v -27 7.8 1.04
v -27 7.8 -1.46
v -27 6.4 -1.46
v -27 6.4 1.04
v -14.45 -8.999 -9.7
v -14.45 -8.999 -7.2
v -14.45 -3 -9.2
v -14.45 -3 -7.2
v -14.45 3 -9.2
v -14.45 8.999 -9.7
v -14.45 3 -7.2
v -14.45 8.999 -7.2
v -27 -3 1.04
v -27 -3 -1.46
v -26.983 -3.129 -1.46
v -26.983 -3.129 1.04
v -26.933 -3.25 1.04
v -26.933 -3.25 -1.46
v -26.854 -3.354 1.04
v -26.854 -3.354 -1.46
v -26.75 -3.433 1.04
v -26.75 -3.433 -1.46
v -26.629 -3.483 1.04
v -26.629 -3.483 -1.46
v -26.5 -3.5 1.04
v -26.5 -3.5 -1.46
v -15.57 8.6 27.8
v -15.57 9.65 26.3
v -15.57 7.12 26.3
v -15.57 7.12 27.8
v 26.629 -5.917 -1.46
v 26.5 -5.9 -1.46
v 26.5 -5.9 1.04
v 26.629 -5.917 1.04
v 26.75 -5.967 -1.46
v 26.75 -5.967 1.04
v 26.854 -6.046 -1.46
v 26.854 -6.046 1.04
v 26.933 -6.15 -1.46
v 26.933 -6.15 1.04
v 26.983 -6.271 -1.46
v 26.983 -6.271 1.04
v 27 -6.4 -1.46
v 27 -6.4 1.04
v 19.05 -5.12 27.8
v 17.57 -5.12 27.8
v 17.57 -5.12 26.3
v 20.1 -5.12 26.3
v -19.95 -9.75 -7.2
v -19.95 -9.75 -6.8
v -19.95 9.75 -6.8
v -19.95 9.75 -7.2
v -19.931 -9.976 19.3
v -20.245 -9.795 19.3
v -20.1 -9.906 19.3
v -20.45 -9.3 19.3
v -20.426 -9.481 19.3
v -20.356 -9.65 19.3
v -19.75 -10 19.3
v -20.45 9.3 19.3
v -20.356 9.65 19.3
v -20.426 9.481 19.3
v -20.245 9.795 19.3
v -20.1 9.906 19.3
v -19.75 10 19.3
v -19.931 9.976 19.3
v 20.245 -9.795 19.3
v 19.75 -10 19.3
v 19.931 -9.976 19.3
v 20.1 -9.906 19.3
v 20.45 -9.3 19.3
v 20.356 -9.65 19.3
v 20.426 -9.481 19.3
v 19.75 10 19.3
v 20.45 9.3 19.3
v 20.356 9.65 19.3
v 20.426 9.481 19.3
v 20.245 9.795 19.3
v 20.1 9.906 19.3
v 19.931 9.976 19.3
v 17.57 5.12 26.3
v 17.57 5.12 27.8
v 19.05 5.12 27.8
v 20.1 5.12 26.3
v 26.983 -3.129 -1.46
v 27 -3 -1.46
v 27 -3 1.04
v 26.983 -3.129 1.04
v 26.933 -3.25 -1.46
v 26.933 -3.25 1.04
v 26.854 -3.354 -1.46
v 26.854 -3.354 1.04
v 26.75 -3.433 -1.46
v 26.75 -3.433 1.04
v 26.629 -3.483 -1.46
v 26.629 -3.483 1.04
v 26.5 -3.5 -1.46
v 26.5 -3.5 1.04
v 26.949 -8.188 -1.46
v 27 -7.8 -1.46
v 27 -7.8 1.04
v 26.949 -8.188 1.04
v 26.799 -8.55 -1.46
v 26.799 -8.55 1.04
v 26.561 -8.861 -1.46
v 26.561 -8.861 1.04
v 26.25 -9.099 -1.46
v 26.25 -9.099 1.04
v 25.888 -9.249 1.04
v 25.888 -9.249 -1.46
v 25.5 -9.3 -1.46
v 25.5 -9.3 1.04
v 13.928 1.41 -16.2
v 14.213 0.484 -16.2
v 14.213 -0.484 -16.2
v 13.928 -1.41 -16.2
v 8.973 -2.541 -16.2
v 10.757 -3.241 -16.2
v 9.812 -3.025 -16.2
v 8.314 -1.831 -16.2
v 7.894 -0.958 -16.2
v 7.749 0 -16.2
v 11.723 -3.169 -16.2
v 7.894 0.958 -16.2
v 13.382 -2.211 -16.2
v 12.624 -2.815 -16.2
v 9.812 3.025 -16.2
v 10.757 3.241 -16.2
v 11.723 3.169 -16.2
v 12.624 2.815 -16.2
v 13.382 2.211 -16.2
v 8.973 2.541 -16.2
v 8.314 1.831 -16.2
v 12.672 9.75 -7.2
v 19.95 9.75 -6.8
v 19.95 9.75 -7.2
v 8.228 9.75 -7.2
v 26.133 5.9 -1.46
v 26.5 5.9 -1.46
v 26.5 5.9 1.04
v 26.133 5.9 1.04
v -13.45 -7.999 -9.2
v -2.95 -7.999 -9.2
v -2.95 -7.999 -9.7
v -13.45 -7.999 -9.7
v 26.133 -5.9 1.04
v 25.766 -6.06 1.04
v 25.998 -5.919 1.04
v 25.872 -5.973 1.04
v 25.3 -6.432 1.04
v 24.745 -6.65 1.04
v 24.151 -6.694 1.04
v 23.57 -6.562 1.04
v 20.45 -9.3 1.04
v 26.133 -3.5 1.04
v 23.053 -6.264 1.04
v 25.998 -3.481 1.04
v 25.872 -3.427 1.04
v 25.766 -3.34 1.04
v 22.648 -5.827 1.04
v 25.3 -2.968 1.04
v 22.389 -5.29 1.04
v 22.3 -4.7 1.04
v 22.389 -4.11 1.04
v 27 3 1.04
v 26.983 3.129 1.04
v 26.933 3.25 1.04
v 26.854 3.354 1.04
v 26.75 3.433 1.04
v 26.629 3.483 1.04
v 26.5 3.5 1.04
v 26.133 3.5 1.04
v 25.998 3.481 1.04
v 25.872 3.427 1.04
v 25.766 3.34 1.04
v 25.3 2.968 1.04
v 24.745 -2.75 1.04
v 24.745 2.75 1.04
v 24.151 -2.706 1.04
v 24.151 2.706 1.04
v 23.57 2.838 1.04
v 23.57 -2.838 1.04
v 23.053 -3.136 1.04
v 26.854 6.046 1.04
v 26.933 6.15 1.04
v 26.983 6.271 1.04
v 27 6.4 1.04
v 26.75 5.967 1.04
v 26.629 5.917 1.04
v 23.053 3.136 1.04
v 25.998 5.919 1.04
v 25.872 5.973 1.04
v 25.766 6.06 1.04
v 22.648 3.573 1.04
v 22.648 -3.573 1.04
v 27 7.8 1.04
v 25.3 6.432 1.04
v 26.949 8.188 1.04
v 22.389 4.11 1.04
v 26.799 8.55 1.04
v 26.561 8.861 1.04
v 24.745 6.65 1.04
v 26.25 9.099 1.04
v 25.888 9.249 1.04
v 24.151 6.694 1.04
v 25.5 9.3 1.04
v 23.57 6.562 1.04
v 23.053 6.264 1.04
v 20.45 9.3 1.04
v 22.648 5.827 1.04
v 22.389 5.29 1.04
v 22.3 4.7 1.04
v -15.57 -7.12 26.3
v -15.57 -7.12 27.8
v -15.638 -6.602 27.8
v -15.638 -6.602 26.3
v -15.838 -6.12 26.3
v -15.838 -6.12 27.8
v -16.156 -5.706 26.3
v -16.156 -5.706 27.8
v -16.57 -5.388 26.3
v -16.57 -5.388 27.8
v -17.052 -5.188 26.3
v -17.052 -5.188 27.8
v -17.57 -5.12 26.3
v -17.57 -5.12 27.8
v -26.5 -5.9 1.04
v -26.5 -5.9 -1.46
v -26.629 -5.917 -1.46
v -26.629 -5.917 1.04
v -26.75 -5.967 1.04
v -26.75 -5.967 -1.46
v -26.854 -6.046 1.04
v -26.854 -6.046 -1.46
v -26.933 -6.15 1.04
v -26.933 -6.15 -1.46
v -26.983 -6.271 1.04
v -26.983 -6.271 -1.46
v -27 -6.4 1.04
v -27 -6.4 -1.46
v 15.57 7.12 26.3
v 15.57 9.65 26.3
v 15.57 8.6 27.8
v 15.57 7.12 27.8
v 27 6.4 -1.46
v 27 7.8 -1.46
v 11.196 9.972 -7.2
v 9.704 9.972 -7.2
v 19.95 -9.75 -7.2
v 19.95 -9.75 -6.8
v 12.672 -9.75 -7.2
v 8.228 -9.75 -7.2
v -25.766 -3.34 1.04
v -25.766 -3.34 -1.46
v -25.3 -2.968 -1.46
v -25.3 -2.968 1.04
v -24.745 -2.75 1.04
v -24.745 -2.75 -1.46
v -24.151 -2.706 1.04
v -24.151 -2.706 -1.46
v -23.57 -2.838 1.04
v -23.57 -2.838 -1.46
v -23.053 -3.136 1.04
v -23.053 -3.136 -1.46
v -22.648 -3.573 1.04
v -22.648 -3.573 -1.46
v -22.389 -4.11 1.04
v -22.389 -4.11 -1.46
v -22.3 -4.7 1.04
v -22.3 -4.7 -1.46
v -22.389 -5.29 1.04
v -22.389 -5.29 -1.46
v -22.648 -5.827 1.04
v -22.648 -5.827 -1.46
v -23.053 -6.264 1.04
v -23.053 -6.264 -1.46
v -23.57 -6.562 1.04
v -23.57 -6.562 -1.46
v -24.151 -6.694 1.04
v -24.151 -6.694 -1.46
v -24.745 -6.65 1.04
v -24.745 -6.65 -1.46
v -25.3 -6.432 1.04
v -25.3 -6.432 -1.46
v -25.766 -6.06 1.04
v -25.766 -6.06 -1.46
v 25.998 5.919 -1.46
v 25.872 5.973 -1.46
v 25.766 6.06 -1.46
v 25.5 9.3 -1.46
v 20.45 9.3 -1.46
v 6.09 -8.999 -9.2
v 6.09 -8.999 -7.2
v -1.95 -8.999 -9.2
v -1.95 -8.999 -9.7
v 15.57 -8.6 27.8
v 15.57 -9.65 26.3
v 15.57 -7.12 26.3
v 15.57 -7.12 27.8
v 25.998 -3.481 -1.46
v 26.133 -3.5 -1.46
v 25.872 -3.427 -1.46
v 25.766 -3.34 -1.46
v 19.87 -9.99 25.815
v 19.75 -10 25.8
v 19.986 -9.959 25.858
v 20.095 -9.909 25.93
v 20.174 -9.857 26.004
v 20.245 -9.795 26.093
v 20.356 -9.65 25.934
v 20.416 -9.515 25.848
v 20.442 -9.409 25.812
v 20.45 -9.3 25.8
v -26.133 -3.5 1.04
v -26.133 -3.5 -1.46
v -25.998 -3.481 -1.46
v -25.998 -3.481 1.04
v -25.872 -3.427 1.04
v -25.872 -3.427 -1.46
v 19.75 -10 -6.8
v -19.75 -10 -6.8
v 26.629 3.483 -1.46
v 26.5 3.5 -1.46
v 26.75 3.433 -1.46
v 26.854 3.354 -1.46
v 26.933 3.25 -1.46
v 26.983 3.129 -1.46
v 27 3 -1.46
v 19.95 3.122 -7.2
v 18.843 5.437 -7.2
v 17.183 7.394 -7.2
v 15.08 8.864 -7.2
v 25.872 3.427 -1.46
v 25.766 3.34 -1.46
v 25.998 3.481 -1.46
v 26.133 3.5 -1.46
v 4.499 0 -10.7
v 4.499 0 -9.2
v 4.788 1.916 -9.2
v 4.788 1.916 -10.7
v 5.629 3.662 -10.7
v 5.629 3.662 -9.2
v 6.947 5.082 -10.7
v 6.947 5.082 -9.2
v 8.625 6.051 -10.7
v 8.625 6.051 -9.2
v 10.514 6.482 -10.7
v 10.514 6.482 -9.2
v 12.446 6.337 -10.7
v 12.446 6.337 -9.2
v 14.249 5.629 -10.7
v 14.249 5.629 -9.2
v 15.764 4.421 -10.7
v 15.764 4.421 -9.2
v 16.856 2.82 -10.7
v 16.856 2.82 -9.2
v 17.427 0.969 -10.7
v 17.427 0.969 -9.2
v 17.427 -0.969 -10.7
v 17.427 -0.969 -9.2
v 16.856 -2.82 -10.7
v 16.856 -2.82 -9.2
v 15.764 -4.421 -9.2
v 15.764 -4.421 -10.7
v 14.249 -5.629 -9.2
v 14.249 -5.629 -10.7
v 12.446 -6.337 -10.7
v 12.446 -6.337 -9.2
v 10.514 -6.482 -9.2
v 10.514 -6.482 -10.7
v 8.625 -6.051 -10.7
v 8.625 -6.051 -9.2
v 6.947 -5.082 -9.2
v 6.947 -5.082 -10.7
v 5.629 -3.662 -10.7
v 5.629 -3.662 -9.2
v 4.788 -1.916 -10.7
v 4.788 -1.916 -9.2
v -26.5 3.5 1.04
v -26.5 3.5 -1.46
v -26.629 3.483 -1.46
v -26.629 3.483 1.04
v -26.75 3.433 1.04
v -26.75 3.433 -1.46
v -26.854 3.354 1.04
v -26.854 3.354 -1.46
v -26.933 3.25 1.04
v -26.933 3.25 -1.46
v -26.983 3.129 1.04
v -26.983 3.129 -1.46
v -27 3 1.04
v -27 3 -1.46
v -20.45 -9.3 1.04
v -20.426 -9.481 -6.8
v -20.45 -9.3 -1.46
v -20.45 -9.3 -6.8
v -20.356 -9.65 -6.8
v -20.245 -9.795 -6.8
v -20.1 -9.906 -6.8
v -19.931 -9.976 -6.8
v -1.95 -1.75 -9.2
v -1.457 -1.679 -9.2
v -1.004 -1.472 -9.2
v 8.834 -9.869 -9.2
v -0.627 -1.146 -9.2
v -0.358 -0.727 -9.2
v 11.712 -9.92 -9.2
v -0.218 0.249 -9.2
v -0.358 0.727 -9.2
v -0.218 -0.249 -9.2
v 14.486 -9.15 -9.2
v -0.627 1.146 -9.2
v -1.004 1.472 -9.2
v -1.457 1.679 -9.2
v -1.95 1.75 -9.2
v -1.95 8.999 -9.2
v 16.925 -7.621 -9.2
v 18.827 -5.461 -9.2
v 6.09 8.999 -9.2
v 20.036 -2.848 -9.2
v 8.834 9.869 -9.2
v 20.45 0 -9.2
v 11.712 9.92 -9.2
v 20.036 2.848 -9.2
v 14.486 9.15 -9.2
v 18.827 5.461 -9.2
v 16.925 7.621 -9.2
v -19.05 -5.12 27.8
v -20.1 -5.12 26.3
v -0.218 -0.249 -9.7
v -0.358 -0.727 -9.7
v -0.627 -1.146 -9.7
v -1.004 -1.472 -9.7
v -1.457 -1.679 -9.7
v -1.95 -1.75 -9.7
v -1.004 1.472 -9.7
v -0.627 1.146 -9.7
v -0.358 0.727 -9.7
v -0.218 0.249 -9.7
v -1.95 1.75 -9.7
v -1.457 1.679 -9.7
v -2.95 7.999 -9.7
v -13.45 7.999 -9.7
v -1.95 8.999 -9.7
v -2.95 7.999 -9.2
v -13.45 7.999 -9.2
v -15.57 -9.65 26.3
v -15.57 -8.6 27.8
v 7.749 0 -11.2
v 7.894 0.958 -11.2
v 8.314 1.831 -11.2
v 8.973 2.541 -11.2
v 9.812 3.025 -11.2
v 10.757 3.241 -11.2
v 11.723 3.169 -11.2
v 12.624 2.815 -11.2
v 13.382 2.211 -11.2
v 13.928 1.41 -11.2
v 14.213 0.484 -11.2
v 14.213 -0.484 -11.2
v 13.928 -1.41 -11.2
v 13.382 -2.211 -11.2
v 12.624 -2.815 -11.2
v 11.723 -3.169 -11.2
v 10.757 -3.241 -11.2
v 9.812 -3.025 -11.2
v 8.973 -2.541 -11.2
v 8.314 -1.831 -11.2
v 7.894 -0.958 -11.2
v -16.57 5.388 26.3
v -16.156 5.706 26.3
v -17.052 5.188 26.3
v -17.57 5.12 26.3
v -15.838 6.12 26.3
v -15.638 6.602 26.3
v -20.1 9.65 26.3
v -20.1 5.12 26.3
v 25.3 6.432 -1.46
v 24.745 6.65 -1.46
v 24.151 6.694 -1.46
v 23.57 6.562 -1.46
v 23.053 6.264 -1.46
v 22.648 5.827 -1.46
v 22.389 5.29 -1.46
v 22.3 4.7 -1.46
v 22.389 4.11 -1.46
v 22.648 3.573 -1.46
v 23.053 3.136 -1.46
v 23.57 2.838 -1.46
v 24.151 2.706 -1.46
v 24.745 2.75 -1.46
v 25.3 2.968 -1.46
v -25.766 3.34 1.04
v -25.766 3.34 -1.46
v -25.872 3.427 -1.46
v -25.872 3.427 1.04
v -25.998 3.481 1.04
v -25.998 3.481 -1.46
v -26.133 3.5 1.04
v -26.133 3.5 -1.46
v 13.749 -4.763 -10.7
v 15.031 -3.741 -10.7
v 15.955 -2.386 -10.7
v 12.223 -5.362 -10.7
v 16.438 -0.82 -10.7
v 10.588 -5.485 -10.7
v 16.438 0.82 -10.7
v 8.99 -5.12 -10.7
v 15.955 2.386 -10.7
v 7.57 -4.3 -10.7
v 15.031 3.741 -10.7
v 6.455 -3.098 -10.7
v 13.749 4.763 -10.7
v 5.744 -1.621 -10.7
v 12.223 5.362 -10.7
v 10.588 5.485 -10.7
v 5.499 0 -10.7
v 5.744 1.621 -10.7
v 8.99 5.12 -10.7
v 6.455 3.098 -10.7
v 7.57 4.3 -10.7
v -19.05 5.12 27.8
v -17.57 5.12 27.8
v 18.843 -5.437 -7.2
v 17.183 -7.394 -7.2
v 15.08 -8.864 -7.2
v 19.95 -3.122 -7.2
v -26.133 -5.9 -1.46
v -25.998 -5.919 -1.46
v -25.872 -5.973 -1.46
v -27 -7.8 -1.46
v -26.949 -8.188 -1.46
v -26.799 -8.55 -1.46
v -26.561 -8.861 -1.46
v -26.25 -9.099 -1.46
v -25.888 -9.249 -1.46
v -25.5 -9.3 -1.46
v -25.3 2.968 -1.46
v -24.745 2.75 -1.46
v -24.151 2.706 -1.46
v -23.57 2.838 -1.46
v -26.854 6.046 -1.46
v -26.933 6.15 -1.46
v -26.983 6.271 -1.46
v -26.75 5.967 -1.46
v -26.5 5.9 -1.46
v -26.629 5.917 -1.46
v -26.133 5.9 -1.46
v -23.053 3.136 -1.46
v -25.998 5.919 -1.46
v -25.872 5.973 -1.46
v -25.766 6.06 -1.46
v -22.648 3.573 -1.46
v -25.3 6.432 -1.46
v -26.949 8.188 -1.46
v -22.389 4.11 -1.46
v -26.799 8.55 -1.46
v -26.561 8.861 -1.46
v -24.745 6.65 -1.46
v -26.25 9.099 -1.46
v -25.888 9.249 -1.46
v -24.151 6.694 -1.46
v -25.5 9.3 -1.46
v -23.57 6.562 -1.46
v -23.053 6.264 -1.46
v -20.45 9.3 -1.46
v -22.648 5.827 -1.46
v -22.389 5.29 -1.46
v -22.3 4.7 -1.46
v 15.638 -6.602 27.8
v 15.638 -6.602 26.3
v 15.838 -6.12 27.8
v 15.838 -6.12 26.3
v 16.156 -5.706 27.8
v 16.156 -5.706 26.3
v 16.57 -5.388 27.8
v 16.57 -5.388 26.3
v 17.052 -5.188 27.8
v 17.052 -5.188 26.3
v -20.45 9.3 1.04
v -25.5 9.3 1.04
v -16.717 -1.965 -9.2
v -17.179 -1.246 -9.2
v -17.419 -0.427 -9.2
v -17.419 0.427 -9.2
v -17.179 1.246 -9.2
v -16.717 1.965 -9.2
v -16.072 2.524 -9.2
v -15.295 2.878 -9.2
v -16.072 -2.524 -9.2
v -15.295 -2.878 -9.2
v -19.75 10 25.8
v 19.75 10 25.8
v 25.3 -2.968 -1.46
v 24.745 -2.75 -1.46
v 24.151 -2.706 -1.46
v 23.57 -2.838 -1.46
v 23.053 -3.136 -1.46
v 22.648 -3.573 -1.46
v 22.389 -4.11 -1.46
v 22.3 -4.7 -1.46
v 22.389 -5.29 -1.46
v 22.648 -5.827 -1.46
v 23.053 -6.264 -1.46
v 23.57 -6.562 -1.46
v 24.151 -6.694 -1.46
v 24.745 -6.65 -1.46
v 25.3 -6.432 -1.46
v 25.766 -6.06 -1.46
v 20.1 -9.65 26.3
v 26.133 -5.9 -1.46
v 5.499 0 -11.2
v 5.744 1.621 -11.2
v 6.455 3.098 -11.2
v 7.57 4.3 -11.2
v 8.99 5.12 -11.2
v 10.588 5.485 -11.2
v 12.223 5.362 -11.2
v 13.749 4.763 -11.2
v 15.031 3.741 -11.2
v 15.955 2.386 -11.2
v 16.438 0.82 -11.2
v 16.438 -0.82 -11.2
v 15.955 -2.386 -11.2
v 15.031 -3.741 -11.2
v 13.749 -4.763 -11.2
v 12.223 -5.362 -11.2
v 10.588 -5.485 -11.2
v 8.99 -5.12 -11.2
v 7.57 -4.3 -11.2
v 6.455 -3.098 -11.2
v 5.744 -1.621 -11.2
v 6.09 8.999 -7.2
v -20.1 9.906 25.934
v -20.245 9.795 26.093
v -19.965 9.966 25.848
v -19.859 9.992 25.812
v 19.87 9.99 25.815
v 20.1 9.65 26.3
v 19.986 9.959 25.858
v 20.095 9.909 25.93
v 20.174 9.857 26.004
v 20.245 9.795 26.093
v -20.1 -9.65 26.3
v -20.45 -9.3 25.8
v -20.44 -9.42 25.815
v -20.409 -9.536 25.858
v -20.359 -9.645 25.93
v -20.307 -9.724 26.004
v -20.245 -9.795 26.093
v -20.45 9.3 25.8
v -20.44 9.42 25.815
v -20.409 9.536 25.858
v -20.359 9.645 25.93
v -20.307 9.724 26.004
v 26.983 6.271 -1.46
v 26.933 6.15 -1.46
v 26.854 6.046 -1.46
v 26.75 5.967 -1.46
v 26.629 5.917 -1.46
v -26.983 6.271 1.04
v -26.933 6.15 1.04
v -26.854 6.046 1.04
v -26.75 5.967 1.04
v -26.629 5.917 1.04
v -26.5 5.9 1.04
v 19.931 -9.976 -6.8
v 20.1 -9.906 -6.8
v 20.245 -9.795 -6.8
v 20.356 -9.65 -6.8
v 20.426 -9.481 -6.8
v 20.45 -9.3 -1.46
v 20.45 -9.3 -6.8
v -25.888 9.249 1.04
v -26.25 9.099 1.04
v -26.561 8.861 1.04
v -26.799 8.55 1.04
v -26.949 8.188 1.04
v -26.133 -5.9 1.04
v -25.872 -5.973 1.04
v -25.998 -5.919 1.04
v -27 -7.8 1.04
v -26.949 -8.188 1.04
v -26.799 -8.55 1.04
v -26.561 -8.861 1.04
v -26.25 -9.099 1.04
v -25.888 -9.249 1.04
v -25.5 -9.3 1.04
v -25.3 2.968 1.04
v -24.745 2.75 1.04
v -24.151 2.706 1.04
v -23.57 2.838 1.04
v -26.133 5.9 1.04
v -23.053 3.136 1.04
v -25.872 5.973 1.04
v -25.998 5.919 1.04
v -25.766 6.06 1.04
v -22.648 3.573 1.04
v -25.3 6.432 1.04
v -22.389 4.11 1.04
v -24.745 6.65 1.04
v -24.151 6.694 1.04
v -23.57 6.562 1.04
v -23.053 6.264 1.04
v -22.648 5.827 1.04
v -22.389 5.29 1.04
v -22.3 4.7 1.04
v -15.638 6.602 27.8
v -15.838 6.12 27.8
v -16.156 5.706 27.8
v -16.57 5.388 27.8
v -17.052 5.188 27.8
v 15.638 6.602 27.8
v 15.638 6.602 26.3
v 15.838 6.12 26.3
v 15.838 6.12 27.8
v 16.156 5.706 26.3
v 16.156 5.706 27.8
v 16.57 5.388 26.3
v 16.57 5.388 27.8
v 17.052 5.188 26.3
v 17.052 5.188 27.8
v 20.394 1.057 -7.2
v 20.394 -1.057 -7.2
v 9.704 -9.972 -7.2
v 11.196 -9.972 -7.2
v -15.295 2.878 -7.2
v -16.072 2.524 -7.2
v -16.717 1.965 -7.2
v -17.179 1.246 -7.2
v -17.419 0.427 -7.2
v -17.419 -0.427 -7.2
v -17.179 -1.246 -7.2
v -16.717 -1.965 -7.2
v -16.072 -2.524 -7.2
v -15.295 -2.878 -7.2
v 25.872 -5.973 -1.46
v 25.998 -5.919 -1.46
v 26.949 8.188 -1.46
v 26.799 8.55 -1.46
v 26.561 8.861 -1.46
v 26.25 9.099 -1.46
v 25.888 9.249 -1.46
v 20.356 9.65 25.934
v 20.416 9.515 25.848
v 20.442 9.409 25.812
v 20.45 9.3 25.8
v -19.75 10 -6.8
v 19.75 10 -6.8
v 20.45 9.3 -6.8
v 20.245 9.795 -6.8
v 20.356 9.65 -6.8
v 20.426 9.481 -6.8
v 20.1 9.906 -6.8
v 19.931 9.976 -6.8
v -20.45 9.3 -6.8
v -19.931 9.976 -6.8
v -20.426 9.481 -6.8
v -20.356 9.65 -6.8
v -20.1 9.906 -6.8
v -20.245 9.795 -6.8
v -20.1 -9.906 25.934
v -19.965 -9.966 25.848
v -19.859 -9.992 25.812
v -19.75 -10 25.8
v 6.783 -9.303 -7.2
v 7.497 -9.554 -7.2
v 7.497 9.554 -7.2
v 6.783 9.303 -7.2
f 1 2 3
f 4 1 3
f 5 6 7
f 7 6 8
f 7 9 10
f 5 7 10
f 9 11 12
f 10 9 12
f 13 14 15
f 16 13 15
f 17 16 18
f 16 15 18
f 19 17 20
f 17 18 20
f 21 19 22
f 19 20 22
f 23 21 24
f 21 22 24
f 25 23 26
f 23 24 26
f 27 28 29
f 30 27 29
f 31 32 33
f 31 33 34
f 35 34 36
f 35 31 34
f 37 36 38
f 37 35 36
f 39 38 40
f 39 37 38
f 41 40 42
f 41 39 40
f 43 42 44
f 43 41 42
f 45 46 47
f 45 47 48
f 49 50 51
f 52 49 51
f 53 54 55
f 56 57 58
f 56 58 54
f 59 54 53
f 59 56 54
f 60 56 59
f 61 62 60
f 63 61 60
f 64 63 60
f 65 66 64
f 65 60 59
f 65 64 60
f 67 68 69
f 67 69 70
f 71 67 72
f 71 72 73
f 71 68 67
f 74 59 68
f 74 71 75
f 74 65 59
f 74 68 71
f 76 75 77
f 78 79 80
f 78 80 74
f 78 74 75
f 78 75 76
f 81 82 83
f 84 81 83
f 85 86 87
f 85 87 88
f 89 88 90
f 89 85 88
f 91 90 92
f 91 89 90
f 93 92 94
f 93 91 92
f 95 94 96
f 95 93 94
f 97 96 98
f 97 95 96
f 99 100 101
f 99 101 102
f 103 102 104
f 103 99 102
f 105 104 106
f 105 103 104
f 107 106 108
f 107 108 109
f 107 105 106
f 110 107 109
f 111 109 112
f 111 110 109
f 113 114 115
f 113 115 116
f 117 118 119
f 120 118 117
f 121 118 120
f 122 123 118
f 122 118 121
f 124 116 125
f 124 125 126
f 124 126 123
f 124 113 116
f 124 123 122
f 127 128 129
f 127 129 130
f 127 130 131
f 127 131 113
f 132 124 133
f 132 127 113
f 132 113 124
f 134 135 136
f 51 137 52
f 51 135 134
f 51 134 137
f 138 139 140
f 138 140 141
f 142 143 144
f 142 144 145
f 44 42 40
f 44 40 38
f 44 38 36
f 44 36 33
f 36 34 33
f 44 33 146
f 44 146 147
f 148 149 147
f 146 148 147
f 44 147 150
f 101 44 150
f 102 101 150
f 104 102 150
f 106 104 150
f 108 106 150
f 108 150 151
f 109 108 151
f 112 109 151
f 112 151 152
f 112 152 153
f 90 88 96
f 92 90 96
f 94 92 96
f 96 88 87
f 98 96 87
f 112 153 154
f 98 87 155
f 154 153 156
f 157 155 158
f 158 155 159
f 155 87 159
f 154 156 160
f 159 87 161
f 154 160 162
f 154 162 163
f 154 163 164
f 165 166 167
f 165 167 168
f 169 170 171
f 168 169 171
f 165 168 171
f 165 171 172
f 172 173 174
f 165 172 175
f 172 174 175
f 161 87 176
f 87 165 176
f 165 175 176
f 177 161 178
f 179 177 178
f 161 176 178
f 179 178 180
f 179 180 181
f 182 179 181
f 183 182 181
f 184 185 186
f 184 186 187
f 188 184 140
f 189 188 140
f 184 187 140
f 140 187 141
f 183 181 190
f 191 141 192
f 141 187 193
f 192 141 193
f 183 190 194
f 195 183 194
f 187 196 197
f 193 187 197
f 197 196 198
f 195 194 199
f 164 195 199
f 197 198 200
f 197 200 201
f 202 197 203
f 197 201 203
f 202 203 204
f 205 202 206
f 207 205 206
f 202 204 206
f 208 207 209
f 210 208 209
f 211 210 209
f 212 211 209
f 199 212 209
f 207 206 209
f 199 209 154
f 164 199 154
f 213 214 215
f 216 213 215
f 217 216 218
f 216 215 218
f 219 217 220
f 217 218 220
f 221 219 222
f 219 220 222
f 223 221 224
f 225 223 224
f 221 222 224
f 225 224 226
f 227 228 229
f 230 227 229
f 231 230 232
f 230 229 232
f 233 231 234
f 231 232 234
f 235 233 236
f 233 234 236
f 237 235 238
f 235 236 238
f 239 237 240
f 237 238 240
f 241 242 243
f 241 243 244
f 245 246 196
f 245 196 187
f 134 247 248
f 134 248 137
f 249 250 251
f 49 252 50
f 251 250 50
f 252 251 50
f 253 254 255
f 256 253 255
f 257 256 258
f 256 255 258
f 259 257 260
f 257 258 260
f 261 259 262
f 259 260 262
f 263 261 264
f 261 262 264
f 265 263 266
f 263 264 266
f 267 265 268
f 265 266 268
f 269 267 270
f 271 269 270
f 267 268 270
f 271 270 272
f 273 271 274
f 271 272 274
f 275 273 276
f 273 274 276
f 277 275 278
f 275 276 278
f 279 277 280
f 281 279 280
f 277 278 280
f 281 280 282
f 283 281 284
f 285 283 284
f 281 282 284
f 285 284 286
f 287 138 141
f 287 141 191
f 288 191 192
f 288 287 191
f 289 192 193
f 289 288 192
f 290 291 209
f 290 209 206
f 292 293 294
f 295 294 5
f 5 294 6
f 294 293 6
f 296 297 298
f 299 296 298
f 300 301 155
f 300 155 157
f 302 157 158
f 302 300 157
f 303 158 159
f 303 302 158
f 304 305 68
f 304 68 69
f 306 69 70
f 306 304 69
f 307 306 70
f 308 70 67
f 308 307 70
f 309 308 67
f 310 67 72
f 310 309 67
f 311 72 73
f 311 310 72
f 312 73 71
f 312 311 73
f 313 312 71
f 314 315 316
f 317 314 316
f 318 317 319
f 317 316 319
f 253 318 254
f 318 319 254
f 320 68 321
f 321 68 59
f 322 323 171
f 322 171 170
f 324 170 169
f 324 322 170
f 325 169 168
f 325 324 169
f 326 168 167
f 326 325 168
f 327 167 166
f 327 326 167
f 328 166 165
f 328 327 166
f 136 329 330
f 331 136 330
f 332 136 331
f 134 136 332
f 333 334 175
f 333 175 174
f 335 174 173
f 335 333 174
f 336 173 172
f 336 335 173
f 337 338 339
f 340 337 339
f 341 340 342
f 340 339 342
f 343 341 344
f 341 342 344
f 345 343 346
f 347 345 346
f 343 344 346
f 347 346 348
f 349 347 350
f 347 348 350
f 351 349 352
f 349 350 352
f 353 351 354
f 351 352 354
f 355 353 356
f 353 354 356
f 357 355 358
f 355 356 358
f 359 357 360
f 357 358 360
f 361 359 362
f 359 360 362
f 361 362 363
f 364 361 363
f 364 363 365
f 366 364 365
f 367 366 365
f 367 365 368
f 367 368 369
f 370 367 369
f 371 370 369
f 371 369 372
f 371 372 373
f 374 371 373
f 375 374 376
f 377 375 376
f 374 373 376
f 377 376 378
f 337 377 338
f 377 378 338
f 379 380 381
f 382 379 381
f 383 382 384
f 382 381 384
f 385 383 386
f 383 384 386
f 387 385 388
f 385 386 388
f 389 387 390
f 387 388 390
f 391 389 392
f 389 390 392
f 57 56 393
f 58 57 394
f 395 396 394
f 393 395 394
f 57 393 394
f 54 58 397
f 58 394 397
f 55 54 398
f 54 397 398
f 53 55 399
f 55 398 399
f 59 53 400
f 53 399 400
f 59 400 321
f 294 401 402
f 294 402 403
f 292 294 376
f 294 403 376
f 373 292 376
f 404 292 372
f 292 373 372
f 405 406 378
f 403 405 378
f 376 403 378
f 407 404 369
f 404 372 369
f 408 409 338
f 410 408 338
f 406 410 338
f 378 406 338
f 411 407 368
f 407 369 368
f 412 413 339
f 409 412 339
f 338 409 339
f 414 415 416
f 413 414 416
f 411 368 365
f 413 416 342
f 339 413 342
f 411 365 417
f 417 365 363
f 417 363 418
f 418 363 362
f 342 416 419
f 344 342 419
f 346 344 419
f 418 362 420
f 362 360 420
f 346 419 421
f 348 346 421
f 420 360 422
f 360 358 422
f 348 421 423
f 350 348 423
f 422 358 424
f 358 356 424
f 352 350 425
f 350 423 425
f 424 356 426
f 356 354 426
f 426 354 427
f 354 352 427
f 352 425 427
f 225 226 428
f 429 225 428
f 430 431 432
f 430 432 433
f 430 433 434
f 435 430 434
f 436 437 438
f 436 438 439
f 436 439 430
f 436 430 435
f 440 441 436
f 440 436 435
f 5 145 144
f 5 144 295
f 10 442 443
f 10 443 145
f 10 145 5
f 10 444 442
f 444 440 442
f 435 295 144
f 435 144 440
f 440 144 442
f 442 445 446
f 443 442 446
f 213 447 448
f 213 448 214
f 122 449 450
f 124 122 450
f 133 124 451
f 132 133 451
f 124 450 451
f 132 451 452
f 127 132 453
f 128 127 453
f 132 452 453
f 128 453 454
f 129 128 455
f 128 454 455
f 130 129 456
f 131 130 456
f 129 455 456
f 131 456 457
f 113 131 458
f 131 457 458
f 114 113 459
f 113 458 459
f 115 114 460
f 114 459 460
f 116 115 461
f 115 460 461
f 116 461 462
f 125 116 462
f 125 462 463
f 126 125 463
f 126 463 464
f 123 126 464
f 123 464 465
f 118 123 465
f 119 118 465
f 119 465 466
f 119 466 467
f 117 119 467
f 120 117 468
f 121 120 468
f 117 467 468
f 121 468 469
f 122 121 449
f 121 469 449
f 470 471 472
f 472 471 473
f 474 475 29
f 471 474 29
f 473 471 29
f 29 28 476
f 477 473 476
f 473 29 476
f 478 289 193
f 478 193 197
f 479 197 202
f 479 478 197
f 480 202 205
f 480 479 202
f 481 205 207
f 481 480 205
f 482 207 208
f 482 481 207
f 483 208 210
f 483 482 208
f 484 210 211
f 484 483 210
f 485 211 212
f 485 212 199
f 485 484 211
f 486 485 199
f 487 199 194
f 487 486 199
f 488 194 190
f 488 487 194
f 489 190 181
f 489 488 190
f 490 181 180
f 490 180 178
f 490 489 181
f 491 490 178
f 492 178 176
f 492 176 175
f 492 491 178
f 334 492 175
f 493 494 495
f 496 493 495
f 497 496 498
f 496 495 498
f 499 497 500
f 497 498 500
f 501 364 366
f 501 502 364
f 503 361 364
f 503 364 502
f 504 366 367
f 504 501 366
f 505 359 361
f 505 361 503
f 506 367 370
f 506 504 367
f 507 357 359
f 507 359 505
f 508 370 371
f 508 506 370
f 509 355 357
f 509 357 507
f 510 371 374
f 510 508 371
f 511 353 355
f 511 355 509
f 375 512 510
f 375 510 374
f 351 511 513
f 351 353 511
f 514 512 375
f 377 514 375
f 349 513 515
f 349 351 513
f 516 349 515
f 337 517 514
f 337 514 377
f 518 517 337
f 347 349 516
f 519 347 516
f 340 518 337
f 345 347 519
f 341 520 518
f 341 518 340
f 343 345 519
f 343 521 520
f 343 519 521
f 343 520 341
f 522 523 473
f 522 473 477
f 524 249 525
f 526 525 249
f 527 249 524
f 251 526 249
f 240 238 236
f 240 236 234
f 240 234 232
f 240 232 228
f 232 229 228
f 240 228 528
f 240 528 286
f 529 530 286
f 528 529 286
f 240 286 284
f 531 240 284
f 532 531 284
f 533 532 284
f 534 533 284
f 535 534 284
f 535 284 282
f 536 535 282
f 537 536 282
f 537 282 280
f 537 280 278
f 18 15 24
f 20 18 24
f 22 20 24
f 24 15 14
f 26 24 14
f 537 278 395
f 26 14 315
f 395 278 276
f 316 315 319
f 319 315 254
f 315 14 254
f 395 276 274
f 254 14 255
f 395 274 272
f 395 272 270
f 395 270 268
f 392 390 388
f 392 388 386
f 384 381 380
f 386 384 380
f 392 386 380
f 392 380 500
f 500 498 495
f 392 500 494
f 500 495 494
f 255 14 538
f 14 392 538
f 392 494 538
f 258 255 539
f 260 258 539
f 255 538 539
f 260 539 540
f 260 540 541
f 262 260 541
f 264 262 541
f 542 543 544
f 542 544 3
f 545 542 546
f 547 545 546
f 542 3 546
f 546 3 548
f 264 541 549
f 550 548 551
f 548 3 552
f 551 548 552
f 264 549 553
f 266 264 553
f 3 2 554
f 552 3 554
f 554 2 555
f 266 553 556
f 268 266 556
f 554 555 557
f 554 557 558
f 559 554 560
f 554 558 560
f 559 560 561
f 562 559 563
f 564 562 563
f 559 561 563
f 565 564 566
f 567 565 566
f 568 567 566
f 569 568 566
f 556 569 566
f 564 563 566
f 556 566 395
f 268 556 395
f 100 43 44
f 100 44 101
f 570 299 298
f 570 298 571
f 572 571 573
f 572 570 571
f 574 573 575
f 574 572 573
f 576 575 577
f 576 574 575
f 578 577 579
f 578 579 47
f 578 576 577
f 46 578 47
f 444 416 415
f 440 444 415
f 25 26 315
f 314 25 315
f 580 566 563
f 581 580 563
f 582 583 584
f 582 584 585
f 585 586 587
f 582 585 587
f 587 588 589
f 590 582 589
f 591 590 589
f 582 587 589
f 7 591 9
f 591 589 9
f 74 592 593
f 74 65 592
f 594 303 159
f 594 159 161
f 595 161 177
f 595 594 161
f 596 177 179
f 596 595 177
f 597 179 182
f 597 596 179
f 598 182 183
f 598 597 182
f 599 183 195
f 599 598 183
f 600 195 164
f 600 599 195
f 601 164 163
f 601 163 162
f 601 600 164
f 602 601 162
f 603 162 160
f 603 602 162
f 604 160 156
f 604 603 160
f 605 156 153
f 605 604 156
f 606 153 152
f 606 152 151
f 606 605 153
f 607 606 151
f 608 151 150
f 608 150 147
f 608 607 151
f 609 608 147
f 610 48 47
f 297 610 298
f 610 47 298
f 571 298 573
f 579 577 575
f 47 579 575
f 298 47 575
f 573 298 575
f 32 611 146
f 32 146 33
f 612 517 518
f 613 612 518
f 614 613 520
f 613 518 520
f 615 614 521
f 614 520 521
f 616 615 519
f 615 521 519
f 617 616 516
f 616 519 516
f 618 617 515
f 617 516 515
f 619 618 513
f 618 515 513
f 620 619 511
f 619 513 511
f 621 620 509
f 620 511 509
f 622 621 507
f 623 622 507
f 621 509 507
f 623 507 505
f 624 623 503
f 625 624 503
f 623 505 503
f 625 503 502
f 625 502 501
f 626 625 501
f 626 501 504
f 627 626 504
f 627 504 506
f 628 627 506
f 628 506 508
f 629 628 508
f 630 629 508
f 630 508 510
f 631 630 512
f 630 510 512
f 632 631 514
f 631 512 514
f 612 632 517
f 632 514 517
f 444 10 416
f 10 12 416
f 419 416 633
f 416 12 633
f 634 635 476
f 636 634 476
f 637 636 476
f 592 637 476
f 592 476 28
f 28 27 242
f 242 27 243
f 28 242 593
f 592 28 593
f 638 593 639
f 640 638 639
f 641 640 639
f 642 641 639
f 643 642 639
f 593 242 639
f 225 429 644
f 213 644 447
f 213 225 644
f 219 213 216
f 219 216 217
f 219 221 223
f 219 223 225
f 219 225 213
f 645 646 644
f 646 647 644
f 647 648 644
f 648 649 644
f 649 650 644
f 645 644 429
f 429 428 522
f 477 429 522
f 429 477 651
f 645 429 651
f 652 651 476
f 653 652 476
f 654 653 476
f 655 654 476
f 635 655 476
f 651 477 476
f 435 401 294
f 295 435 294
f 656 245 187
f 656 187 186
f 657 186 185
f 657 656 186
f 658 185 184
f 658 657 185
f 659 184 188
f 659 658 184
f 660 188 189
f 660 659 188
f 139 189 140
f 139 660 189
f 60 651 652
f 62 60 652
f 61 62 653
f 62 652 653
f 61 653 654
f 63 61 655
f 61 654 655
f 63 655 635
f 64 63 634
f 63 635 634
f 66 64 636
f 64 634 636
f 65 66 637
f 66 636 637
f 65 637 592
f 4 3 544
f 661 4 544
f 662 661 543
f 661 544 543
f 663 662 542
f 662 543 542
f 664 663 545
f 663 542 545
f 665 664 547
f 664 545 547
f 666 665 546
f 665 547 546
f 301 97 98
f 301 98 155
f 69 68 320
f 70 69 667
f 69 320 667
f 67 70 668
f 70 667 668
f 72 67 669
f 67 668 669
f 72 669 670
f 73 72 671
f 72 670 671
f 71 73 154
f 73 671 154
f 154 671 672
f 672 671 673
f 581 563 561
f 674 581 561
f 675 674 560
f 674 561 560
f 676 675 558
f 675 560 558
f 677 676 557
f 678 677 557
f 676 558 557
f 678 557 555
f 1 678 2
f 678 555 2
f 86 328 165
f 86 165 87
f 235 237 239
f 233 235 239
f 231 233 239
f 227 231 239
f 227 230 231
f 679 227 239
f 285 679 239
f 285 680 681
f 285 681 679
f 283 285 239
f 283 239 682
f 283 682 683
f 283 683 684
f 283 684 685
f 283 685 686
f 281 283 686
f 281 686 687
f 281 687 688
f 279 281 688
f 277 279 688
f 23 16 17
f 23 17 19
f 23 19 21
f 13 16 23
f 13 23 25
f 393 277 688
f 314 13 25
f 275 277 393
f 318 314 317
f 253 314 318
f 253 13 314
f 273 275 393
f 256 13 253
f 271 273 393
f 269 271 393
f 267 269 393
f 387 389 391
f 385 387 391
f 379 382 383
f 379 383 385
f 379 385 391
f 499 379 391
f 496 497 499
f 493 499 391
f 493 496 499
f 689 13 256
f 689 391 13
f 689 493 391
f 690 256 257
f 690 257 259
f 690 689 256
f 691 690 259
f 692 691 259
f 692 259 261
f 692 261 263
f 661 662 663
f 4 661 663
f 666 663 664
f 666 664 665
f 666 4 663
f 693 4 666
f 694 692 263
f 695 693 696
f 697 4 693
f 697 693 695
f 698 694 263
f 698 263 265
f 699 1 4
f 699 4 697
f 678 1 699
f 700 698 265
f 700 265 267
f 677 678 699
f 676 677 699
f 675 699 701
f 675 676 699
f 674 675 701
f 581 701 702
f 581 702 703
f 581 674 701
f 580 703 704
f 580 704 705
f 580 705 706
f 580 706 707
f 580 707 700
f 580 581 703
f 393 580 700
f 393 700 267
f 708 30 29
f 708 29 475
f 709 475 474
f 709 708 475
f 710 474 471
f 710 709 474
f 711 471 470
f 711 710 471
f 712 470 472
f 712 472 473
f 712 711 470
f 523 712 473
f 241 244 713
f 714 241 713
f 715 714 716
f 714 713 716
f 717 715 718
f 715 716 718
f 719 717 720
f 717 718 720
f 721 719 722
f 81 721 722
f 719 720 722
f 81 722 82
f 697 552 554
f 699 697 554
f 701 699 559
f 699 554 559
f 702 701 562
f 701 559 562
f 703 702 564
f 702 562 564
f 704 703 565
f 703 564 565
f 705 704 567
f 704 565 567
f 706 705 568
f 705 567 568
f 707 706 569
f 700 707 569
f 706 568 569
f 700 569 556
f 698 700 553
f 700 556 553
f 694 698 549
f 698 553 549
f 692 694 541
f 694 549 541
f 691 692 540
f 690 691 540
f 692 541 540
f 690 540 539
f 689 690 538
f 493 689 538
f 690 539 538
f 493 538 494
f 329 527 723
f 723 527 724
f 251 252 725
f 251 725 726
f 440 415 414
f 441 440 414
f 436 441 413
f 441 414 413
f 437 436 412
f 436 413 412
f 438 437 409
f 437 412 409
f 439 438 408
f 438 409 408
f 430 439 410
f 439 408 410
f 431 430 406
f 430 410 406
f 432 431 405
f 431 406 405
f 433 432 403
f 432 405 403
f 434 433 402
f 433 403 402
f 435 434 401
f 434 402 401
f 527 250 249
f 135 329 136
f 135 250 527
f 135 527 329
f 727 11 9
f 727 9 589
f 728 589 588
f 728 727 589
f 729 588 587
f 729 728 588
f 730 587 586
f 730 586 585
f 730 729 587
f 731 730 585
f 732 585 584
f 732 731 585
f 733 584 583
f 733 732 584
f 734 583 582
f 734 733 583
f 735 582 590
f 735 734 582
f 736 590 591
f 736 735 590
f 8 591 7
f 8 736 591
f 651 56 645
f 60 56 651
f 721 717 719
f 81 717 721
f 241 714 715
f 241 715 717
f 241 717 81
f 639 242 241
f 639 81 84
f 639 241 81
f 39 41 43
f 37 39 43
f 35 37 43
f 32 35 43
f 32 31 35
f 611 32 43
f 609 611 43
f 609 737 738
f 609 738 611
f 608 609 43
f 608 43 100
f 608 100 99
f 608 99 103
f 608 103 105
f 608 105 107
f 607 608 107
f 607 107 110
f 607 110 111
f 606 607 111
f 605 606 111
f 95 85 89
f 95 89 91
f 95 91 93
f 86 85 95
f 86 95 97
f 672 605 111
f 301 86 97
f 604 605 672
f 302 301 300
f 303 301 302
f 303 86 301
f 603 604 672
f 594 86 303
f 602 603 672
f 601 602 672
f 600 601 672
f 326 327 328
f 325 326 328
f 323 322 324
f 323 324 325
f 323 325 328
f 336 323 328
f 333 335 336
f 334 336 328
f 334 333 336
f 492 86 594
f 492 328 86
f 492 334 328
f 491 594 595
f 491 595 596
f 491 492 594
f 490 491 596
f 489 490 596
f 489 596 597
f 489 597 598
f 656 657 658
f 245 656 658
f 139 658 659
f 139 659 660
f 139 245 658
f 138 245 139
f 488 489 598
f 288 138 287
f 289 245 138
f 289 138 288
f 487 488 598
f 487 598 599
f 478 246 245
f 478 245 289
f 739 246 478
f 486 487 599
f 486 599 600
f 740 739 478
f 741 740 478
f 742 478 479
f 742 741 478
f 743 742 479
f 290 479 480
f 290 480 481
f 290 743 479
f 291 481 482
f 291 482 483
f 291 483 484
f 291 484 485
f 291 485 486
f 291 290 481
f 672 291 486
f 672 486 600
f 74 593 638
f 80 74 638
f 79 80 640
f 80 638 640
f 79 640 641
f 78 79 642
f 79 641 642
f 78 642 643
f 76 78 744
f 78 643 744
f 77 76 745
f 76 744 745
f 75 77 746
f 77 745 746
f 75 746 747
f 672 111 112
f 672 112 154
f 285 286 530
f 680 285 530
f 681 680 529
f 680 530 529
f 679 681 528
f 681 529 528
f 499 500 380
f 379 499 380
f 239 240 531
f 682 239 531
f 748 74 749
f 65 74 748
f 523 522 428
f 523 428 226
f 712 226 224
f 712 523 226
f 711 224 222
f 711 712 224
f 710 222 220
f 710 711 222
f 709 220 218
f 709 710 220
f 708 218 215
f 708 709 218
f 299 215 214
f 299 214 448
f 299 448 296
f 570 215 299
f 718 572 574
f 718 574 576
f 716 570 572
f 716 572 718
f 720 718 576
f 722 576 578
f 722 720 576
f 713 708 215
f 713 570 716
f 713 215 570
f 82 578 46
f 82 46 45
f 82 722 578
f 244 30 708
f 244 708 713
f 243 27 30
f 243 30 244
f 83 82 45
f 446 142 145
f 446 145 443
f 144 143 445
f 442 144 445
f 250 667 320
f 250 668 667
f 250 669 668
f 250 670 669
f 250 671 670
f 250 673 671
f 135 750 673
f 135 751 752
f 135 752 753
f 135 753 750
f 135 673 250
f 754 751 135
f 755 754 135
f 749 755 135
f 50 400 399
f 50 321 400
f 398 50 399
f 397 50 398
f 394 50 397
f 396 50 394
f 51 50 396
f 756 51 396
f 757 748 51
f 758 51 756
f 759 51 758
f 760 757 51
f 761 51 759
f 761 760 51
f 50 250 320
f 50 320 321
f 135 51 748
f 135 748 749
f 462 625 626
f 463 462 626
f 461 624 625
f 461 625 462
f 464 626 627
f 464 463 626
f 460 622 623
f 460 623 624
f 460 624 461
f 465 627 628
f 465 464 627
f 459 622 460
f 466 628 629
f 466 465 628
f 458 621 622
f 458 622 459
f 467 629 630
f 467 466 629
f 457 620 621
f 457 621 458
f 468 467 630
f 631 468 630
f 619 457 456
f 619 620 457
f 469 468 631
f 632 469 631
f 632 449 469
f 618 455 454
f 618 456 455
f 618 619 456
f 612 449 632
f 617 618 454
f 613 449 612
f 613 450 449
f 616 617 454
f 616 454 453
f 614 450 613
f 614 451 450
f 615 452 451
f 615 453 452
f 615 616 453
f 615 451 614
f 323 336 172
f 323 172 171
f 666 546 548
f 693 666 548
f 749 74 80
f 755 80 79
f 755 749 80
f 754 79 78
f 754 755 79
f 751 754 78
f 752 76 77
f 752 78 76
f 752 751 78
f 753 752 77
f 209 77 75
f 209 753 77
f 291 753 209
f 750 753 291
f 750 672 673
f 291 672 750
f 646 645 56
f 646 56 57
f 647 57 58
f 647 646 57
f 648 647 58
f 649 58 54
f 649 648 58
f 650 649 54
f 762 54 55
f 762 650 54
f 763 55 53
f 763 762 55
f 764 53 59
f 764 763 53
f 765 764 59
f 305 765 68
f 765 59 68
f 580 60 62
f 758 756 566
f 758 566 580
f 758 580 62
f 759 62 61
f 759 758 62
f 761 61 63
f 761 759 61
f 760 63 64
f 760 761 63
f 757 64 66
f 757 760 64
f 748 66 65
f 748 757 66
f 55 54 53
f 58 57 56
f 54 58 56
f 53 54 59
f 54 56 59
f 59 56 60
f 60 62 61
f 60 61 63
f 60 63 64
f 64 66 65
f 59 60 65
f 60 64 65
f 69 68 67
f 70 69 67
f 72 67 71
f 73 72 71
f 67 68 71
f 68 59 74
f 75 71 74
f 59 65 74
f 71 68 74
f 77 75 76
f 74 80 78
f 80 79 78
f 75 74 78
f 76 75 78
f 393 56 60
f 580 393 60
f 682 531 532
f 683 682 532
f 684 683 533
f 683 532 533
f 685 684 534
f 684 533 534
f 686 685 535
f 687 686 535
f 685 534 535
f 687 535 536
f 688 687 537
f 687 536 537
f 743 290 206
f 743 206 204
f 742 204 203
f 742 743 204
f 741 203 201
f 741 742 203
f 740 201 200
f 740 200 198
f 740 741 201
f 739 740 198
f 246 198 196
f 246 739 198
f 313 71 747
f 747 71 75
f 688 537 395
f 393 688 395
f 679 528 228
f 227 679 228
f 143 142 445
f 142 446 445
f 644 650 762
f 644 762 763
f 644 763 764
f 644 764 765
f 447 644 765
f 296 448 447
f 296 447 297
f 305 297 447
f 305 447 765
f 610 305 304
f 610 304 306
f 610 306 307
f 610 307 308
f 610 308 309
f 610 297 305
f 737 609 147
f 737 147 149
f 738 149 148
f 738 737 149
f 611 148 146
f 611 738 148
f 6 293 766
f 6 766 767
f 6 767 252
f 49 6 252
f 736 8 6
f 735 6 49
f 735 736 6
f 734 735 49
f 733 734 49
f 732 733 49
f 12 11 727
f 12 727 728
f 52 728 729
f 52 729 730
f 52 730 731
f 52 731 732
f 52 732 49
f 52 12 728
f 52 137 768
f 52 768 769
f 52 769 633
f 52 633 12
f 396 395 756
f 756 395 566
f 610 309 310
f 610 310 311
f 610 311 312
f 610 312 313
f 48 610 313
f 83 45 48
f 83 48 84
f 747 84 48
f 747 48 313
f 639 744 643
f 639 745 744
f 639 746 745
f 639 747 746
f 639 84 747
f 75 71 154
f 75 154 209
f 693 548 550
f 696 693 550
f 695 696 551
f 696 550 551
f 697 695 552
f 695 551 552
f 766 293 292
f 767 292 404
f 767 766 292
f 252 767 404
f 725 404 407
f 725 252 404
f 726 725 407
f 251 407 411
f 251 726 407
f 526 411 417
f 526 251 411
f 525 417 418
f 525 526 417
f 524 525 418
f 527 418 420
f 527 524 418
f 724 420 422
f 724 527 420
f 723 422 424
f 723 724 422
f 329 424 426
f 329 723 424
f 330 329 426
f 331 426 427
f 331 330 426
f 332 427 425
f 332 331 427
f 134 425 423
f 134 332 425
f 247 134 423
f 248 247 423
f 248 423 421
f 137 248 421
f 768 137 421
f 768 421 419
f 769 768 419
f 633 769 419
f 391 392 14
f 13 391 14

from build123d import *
from OCP.BRepFilletAPI import BRepFilletAPI_MakeChamfer

# Parameters (mm, degrees)
SKETCH1_W            = 40.9
SKETCH1_H            = 20
BOSS_EXTRUDE1_DEPTH  = 19.3
SKETCH4_W            = 40.9
SKETCH4_H            = 20
BOSS_EXTRUDE2_DEPTH  = 6.8
SKETCH5_W            = 40.9
SKETCH5_H            = 20
BOSS_EXTRUDE3_DEPTH  = 8.5
CHAMFER1_SIZE        = 2
CHAMFER1_SIZE2       = 1.400415076
CUT_EXTRUDE1_DEPTH   = 1.5
SKETCH8_W            = 39.9
SKETCH8_H            = 19.5
BOSS_EXTRUDE4_DEPTH  = 0.4
BOSS_EXTRUDE5_DEPTH  = 2
SKETCH11_R           = 6.5
BOSS_EXTRUDE6_DEPTH  = 1.5
SKETCH12_R           = 5.5
BOSS_EXTRUDE7_DEPTH  = 0.5
SKETCH13_R           = 3.25
BOSS_EXTRUDE8_DEPTH  = 5
SKETCH14_W           = 10.5
SKETCH14_H           = 15.998933302
BOSS_EXTRUDE9_DEPTH  = 0.5
FILLET1_R            = 0.7
FILLET2_R            = 0.7
FILLET3_R            = 0.7
BOSS_EXTRUDE10_START = -5.74
BOSS_EXTRUDE10_DEPTH = 2.5


with BuildPart() as part:
    # Sketch1 → Boss-Extrude1 (new body)
    with BuildSketch(Plane.XY):
        Rectangle(SKETCH1_W, SKETCH1_H)
    extrude(amount=BOSS_EXTRUDE1_DEPTH)

    # Fillet1
    fillet1_edges = [part.edges().sort_by_distance(p)[0] for p in [
        (20.45, -10, 9.65),
        (-20.45, -10, 9.65),
        (-20.45, 10, 9.65),
        (20.45, 10, 9.65),
    ]]
    fillet(fillet1_edges, radius=FILLET1_R)



with BuildPart() as body_2:
    # Sketch4 → Boss-Extrude2 (new body)
    with BuildSketch(Plane(origin=(0, 0, 0), x_dir=(-1, 0, 0), z_dir=(0, 0, -1))):
        Rectangle(SKETCH4_W, SKETCH4_H)
    extrude(amount=BOSS_EXTRUDE2_DEPTH)

    # Sketch8 → Boss-Extrude4 (add)
    with BuildSketch(Plane(origin=(0, 0, -6.8), x_dir=(-1, 0, 0), z_dir=(0, 0, -1))):
        Rectangle(SKETCH8_W, SKETCH8_H)
    extrude(amount=BOSS_EXTRUDE4_DEPTH)

    # Sketch9 → Boss-Extrude5 (add)
    with BuildSketch(Plane(origin=(0, 0, -7.2), x_dir=(-1, 0, 0), z_dir=(0, 0, -1))):
        with BuildLine():
            Line((-6.09, 8.999466651), (14.45, 8.999466651))
            Line((14.45, 8.999466651), (14.45, 3))
            ThreePointArc((14.45, 3), (17.45, 0), (14.45, -3))
            Line((14.45, -3), (14.45, -8.999466651))
            Line((14.45, -8.999466651), (-6.09, -8.999466651))
            ThreePointArc((-6.09, -8.999466651), (-20.45, 0), (-6.09, 8.999466651))
        make_face()
    extrude(amount=BOSS_EXTRUDE5_DEPTH)

    # Sketch11 → Boss-Extrude6 (add)
    with BuildSketch(Plane(origin=(0, 0, -9.2), x_dir=(-1, 0, 0), z_dir=(0, 0, -1))):
        with Locations((-10.999432969, 0)):
            Circle(SKETCH11_R)
    extrude(amount=BOSS_EXTRUDE6_DEPTH)

    # Sketch12 → Boss-Extrude7 (add)
    with BuildSketch(Plane(origin=(0, 0, -10.7), x_dir=(-1, 0, 0), z_dir=(0, 0, -1))):
        with Locations((-10.999432969, 0)):
            Circle(SKETCH12_R)
    extrude(amount=BOSS_EXTRUDE7_DEPTH)

    # Sketch13 → Boss-Extrude8 (add)
    with BuildSketch(Plane(origin=(0, 0, -11.2), x_dir=(-1, 0, 0), z_dir=(0, 0, -1))):
        with Locations((-10.999432969, 0)):
            Circle(SKETCH13_R)
    extrude(amount=BOSS_EXTRUDE8_DEPTH)

    # Sketch14 → Boss-Extrude9 (add)
    with BuildSketch(Plane(origin=(0, 0, -9.2), x_dir=(-1, 0, 0), z_dir=(0, 0, -1))):
        with BuildLine():
            Line((14.45, -8.999466651), (14.45, 8.999466651))
            Line((14.45, 8.999466651), (1.95, 8.999466651))
            Line((1.95, 8.999466651), (1.95, 1.75))
            ThreePointArc((1.95, 1.75), (0.2, 0), (1.95, -1.75))
            Line((1.95, -1.75), (1.95, -8.999466651))
            Line((1.95, -8.999466651), (14.45, -8.999466651))
        make_face()
        with Locations((8.2, 0)):
            Rectangle(SKETCH14_W, SKETCH14_H, mode=Mode.SUBTRACT)
    extrude(amount=BOSS_EXTRUDE9_DEPTH)

    # Fillet2
    fillet2_edges = [body_2.edges().sort_by_distance(p)[0] for p in [
        (-20.45, 10, -3.4),
        (-20.45, -10, -3.4),
        (20.45, -10, -3.4),
        (20.45, 10, -3.4),
    ]]
    fillet(fillet2_edges, radius=FILLET2_R)


with BuildPart() as body_3:
    # Sketch5 → Boss-Extrude3 (new body)
    with BuildSketch(Plane.XY.offset(19.3)):
        Rectangle(SKETCH5_W, SKETCH5_H)
    extrude(amount=BOSS_EXTRUDE3_DEPTH)

    # Chamfer1: one chamfer whose edges measure the first distance from different faces: ONE call of the kernel's chamfer builder (chamfer() names one face for all edges)
    chamfer1_edges_1 = [body_3.edges().sort_by_distance(p)[0] for p in [
        (0, 10, 27.8),
    ]]
    chamfer1_side_1 = [body_3.faces().sort_by_distance(p)[0] for p in [
        (0, 10, 23.55),
    ]]
    chamfer1_edges_2 = [body_3.edges().sort_by_distance(p)[0] for p in [
        (-20.45, 0, 27.8),
    ]]
    chamfer1_side_2 = [body_3.faces().sort_by_distance(p)[0] for p in [
        (-20.45, 0, 23.55),
    ]]
    chamfer1_edges_3 = [body_3.edges().sort_by_distance(p)[0] for p in [
        (0, -10, 27.8),
    ]]
    chamfer1_side_3 = [body_3.faces().sort_by_distance(p)[0] for p in [
        (0, -10, 23.55),
    ]]
    chamfer1_edges_4 = [body_3.edges().sort_by_distance(p)[0] for p in [
        (20.45, 0, 27.8),
    ]]
    chamfer1_side_4 = [body_3.faces().sort_by_distance(p)[0] for p in [
        (20.45, 0, 23.55),
    ]]
    chamfer1 = BRepFilletAPI_MakeChamfer(body_3.part.solid().wrapped)
    for e in chamfer1_edges_1:
        chamfer1.Add(CHAMFER1_SIZE, CHAMFER1_SIZE2, e.wrapped, chamfer1_side_1[0].wrapped)  # the first distance lies on this face
    for e in chamfer1_edges_2:
        chamfer1.Add(CHAMFER1_SIZE, CHAMFER1_SIZE2, e.wrapped, chamfer1_side_2[0].wrapped)  # the first distance lies on this face
    for e in chamfer1_edges_3:
        chamfer1.Add(CHAMFER1_SIZE, CHAMFER1_SIZE2, e.wrapped, chamfer1_side_3[0].wrapped)  # the first distance lies on this face
    for e in chamfer1_edges_4:
        chamfer1.Add(CHAMFER1_SIZE, CHAMFER1_SIZE2, e.wrapped, chamfer1_side_4[0].wrapped)  # the first distance lies on this face
    add(Compound.cast(chamfer1.Shape()), mode=Mode.REPLACE)

    # Sketch7 → Cut-Extrude1 (cut)
    with BuildSketch(Plane.XY.offset(27.8)):
        with BuildLine():
            Line((-20.45, 10), (-15.57, 10))
            Line((-15.57, 10), (-15.57, 7.12))
            ThreePointArc((-15.57, 7.12), (-16.155786438, 5.705786438), (-17.57, 5.12))
            Line((-17.57, 5.12), (-20.45, 5.12))
            Line((-20.45, 5.12), (-20.45, 10))
        make_face()
        with BuildLine():
            Line((15.57, 10), (15.57, 7.12))
            ThreePointArc((15.57, 7.12), (16.155786438, 5.705786438), (17.57, 5.12))
            Line((17.57, 5.12), (20.45, 5.12))
            Line((20.45, 5.12), (20.45, 10))
            Line((20.45, 10), (15.57, 10))
        make_face()
        with BuildLine():
            Line((-15.57, -10), (-15.57, -7.12))
            ThreePointArc((-15.57, -7.12), (-16.155786438, -5.705786438), (-17.57, -5.12))
            Line((-17.57, -5.12), (-20.45, -5.12))
            Line((-20.45, -5.12), (-20.45, -10))
            Line((-20.45, -10), (-15.57, -10))
        make_face()
        with BuildLine():
            Line((20.45, -10), (15.57, -10))
            Line((15.57, -10), (15.57, -7.12))
            ThreePointArc((15.57, -7.12), (16.155786438, -5.705786438), (17.57, -5.12))
            Line((17.57, -5.12), (20.45, -5.12))
            Line((20.45, -5.12), (20.45, -10))
        make_face()
    extrude(amount=-CUT_EXTRUDE1_DEPTH, mode=Mode.SUBTRACT)

    # Fillet3
    fillet3_edges = [body_3.edges().sort_by_distance(p)[0] for p in [
        (-20.45, -10, 22.55),
        (-20.45, 10, 22.55),
        (20.45, 10, 22.55),
        (20.45, -10, 22.55),
    ]]
    fillet(fillet3_edges, radius=FILLET3_R)


with BuildPart() as part_1:
    add(part.part)

    add(body_2.part)  # Boss-Extrude10 merges body 2
    # Sketch15 → Boss-Extrude10 (add)
    with BuildSketch(Plane(origin=(0, 0, -7.2), x_dir=(-1, 0, 0), z_dir=(0, 0, -1)).offset(BOSS_EXTRUDE10_START)):
        with BuildLine():
            Line((20.45, 9.3), (25.5, 9.3))
            ThreePointArc((25.5, 9.3), (26.560660172, 8.860660172), (27, 7.8))
            Line((27, 7.8), (27, 6.4))
            ThreePointArc((27, 6.4), (26.853553391, 6.046446609), (26.5, 5.9))
            Line((26.5, 5.9), (26.133030278, 5.9))
            ThreePointArc((26.133030278, 5.9), (25.933030278, 5.941742431), (25.766424222, 6.06))
            ThreePointArc((25.766424222, 6.06), (22.3, 4.7), (25.766424222, 3.34))
            ThreePointArc((25.766424222, 3.34), (25.933030278, 3.458257569), (26.133030278, 3.5))
            Line((26.133030278, 3.5), (26.5, 3.5))
            ThreePointArc((26.5, 3.5), (26.853553391, 3.353553391), (27, 3))
            Line((27, 3), (27, -3))
            ThreePointArc((27, -3), (26.853553391, -3.353553391), (26.5, -3.5))
            Line((26.5, -3.5), (26.133030278, -3.5))
            ThreePointArc((26.133030278, -3.5), (25.933030278, -3.458257569), (25.766424222, -3.34))
            ThreePointArc((25.766424222, -3.34), (22.3, -4.7), (25.766424222, -6.06))
            ThreePointArc((25.766424222, -6.06), (25.933030278, -5.941742431), (26.133030278, -5.9))
            Line((26.133030278, -5.9), (26.5, -5.9))
            ThreePointArc((26.5, -5.9), (26.853553391, -6.046446609), (27, -6.4))
            Line((27, -6.4), (27, -7.8))
            ThreePointArc((27, -7.8), (26.560660172, -8.860660172), (25.5, -9.3))
            Line((25.5, -9.3), (20.45, -9.3))
            Line((20.45, -9.3), (20.45, 9.3))
        make_face()
    boss_extrude10 = extrude(amount=-BOSS_EXTRUDE10_DEPTH)

    # Mirror1: Boss-Extrude10 across plane
    add(boss_extrude10.mirror(Plane(origin=(0, 0, 0), x_dir=(0, 0, 1), z_dir=(1, 0, 0))))


solid = Compound([body_3.part, part_1.part])
